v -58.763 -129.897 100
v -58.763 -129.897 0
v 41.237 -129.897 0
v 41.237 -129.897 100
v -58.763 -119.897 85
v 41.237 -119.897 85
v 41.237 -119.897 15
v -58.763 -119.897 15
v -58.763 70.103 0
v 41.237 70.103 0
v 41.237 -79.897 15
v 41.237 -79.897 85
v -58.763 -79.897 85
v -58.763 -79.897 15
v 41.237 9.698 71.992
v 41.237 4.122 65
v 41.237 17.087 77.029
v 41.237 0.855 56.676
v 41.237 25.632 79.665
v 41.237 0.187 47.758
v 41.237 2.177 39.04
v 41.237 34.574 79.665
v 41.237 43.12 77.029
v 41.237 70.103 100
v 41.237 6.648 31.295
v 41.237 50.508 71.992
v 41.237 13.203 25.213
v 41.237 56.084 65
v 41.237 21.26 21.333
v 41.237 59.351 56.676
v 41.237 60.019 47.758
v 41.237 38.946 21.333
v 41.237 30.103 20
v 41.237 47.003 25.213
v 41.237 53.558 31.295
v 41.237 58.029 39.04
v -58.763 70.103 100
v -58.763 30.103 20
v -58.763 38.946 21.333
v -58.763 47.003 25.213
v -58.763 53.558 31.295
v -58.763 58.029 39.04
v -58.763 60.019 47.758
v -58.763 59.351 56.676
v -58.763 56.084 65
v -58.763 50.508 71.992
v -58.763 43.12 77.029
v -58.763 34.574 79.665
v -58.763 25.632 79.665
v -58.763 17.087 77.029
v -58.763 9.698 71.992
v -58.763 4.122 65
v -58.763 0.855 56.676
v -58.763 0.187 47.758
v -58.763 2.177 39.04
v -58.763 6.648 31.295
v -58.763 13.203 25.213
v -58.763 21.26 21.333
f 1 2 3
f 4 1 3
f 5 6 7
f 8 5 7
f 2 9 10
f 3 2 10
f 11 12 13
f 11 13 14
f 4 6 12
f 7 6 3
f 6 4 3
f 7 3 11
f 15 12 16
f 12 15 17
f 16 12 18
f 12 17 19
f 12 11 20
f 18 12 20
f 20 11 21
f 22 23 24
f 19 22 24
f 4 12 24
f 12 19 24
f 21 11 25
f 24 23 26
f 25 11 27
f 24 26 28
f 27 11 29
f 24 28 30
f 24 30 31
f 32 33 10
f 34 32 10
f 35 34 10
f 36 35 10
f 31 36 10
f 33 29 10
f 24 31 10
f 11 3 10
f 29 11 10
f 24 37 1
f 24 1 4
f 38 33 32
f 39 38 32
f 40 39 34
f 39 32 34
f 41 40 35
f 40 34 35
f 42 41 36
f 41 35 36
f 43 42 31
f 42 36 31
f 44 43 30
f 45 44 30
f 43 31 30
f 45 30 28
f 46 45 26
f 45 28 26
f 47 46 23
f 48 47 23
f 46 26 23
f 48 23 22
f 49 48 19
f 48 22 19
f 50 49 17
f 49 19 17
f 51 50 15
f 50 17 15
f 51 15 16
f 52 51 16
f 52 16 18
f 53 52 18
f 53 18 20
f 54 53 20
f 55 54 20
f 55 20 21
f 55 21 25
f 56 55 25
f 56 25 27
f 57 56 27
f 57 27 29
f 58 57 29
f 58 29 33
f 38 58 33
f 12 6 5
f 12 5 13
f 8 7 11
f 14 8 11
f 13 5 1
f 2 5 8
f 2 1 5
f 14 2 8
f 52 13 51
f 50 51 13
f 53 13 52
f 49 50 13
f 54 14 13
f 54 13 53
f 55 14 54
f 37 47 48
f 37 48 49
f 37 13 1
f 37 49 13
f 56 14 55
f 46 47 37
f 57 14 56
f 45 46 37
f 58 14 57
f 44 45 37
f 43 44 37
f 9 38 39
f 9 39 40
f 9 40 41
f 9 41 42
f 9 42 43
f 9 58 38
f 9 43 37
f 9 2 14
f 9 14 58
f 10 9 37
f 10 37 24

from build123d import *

# Parameters (mm, degrees)
SKETCH_1_W          = 100
SKETCH_1_H          = 200
EXTRUDE_1_DEPTH     = 100
SKETCH_2_R          = 30
SKETCH_2_W          = 70
SKETCH_2_H          = 40
CUT_EXTRUDE_1_DEPTH = 101


with BuildPart() as part:
    # 草图1 → 凸台-拉伸1 (new body)
    with BuildSketch(Plane.XY):
        with Locations((-8.762886598, -29.896907216)):
            Rectangle(SKETCH_1_W, SKETCH_1_H)
    extrude(amount=EXTRUDE_1_DEPTH)

    # 草图2 → 切除-拉伸1 (cut, through all)
    with BuildSketch(Plane(origin=(41.237113402, 0, 0), x_dir=(0, 0, -1), z_dir=(1, 0, 0))):
        with Locations((-50, 30.103092784)):
            Circle(SKETCH_2_R)
        with Locations((-50, -99.896907216)):
            Rectangle(SKETCH_2_W, SKETCH_2_H)
    extrude(amount=-CUT_EXTRUDE_1_DEPTH, mode=Mode.SUBTRACT)


solid = part.part
